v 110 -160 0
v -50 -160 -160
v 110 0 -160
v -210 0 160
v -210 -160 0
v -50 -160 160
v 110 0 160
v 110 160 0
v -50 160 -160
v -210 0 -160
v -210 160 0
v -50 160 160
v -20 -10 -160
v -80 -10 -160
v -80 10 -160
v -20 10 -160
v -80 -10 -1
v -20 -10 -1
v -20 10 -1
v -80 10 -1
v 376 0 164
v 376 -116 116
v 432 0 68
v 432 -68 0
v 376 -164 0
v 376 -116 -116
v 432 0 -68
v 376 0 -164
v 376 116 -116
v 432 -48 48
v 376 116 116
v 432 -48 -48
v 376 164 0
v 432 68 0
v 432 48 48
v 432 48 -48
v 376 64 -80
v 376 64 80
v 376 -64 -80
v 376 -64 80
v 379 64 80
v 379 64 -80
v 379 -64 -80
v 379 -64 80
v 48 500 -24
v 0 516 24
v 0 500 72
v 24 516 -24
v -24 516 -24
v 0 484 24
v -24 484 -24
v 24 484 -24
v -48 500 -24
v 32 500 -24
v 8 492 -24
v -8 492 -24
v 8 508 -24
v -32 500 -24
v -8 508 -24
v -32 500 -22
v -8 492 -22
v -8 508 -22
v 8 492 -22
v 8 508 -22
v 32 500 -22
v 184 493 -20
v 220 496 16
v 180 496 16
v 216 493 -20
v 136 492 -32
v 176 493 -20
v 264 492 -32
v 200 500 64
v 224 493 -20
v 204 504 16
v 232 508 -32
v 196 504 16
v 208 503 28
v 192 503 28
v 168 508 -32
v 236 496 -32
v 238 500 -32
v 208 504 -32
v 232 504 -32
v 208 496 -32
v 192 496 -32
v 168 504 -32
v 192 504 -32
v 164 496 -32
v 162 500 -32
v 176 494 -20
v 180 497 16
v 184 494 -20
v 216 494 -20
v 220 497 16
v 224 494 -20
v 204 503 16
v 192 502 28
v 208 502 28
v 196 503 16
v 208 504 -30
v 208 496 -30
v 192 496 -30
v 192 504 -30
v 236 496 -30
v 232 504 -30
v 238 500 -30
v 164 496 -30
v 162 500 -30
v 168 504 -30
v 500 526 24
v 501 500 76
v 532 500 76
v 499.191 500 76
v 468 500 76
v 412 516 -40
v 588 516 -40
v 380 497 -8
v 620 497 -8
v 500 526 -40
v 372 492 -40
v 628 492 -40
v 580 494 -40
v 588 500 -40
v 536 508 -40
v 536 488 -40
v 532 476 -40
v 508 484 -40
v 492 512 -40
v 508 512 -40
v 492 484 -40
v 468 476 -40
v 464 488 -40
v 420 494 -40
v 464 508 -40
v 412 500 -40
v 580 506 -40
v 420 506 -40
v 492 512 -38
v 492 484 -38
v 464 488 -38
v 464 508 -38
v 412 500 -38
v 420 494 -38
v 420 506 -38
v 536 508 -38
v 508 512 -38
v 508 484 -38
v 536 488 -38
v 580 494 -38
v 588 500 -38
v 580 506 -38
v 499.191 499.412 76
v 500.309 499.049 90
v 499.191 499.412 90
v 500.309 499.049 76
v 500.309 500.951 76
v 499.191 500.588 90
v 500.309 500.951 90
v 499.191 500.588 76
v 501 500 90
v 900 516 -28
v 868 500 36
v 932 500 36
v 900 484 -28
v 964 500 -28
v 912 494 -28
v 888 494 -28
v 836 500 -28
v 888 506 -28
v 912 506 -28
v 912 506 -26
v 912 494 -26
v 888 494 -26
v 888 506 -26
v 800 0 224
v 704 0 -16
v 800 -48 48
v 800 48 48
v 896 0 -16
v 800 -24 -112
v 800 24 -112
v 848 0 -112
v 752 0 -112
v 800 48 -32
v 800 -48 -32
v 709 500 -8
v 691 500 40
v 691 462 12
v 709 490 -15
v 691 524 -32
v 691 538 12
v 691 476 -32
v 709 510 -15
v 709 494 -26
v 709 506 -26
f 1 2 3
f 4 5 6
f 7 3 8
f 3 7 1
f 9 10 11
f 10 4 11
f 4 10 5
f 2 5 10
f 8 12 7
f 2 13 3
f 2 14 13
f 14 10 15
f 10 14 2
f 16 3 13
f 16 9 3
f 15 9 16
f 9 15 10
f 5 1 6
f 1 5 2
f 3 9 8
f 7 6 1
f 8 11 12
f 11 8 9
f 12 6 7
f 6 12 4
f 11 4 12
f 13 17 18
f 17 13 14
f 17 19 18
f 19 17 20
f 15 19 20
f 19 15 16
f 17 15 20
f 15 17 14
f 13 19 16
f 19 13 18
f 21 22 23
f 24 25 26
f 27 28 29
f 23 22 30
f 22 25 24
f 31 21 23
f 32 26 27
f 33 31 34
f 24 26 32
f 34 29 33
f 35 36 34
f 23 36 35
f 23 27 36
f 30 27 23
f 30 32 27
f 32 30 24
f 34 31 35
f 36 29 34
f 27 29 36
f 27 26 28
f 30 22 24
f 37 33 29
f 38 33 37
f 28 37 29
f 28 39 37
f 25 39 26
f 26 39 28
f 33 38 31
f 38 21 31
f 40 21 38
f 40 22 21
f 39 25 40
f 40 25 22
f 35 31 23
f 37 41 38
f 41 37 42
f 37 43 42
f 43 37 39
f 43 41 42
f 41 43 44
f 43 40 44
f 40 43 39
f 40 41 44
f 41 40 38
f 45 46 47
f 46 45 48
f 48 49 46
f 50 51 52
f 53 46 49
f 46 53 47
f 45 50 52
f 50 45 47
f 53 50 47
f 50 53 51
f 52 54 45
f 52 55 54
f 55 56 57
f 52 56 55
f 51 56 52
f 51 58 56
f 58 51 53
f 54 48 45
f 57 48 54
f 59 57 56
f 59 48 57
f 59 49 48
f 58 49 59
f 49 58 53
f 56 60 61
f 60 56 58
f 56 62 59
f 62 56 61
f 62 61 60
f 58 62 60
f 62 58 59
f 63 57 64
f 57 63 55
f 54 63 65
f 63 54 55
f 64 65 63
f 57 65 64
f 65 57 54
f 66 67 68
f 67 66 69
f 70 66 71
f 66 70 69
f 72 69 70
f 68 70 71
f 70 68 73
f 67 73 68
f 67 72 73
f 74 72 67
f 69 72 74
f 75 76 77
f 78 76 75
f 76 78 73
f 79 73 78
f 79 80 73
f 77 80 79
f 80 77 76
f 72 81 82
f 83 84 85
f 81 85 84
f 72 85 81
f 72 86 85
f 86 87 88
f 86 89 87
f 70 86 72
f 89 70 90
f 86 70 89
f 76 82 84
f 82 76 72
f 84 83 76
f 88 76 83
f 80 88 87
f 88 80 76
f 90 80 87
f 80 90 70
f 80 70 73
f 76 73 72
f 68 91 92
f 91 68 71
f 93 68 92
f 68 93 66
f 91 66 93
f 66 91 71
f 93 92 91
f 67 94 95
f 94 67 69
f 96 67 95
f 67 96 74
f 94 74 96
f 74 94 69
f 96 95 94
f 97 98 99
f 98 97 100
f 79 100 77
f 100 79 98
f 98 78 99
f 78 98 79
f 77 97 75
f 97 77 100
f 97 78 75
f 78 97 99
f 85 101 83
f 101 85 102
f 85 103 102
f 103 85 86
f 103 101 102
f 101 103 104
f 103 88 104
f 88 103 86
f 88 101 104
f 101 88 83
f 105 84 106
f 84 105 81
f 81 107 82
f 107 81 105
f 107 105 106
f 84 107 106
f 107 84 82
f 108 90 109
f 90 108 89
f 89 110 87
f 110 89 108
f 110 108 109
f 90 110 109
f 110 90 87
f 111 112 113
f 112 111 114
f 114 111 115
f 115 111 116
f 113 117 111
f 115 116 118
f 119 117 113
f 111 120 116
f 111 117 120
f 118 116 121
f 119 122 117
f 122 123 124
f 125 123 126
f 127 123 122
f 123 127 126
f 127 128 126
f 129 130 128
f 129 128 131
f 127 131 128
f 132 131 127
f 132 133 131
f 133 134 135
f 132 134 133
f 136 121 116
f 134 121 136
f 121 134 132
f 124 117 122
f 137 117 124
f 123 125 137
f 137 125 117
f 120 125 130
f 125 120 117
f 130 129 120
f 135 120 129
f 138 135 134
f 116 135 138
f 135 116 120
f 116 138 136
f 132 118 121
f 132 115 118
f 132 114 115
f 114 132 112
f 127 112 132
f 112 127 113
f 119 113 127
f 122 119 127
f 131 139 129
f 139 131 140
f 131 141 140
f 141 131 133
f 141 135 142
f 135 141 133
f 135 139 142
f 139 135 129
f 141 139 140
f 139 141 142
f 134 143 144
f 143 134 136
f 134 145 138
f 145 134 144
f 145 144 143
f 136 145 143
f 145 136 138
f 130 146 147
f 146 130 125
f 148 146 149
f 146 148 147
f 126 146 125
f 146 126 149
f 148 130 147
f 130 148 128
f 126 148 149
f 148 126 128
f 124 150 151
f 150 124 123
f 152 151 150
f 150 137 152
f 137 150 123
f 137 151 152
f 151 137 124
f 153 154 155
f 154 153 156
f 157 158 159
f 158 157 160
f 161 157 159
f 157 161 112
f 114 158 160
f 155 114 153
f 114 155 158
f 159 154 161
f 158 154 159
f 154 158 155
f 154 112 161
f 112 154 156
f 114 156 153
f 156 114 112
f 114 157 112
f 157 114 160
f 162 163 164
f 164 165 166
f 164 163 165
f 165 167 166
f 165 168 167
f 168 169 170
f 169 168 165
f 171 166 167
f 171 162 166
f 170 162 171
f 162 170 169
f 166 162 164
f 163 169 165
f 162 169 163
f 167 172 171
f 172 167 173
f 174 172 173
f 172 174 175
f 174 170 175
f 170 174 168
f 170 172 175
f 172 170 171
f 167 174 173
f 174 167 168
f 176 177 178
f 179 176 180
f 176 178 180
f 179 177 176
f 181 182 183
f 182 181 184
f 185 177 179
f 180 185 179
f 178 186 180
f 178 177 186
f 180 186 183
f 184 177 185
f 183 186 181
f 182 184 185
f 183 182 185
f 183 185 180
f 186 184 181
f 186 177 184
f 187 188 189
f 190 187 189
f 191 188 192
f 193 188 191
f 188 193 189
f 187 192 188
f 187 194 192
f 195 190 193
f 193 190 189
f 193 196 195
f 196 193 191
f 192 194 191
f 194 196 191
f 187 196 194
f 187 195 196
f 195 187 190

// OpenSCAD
// file: elite.scad
module _extrude_triangle(tri, h, h_base=[0, 0, 0], ccw=false) {
  
  points = [
    tri[0] + h_base,
    tri[1] + h_base,
    tri[2] + h_base,
    tri[0] + h,
    tri[1] + h,
    tri[2] + h,
  ];

  if (ccw == true) {
    points = [
      tri[0] + h_base,
      tri[2] + h_base,
      tri[1] + h_base,
      tri[0] + h,
      tri[2] + h,
      tri[1] + h,
    ];
  }

  polyhedron(points, faces = [
    [0, 1, 2], // top
    [3, 5, 4], // bottom
    [0, 2, 3], [2, 5, 3],
    [1, 0, 3], [1, 3, 4],
    [2, 1, 4], [2, 4, 5],
  ]);

}

module elite_coriolis (r=160, center=false) {

  s = r / 160;

  t = center ? [0, 0, 0] : [160, 160, 160];

  points = [
    [160, 0, 160], [0, 160, 160], [-160, 0, 160], [0, -160, 160], [160, -160, 0],
    [160, 160, 0], [-160, 160, 0], [-160, -160, 0], [160, 0, -160], [0, 160, -160],
    [-160, 0, -160], [0, -160, -160],
  ];

  scale([s, s, s])
  translate(t)
  difference()
  {
    polyhedron( points, faces = [
      [ 0, 4, 3], [ 0, 1, 5 ], [ 1, 2, 6 ], [ 2, 3, 7 ], [ 3, 4, 11, 7 ],
      [ 8, 4, 0, 5], [ 2, 7, 10, 6], [ 1, 6, 9, 5 ], [ 10, 7, 11 ], [ 8, 11, 4 ],
      [ 8, 5, 9 ], [ 6, 10, 9], [ 9, 10, 11, 8 ], [ 0, 3, 2, 1 ],
    ]);

    entry_width = 60;
    entry_height = 20;
    translate([- entry_height / 2, -entry_width / 2, 1])
    cube([entry_height, entry_width, 160]);
  }
}


module elite_cobra_mkiii (width=256, center=false) {

  s = width / 256;
  t = center ? [0, 0, 0] : [120, 26, 40];

  points = [
    [  32,   0,  76], [ -32,   0,  76], [   0,  26,  24], [-120,  -3,  -8], [ 120,  -3,  -8],
    [ -88,  16, -40], [  88,  16, -40], [ 128,  -8, -40], [-128,  -8, -40], [   0,  26, -40],
    [ -32, -24, -40], [  32, -24, -40],
  ];

  scale([s, s, s])
  translate(t)
  {
    difference()
    {
      polyhedron(points, faces=[
        [0, 1, 2], [1, 5, 2], [0, 2, 6], [1, 3, 5], [0, 6, 4],
        [2, 5, 9], [2, 9, 6], [3, 8, 5], [4, 6, 7], [7, 6, 9, 5, 8, 10, 11],
        [1, 10, 8, 3], [11, 10, 1, 0], [0, 4, 7, 11]
      ]);

      // backburner-1
      translate([0, 0, -40-2])
      linear_extrude(height=4)
      polygon(points=[[ -8, 12], [-36, 8], [-36, -12], [-8, -16]]);

      // backburner-1 fin
      translate([0, 0, -40-2])
      linear_extrude(height=4)
      polygon(points=[[-80, 6], [-80, -6], [-88, 0]]);

      // backburner-2
      translate([0, 0, -40-2])
      linear_extrude(height=4)
      polygon(points=[[ 8, 12], [36, 8], [36, -12], [8, -16]]);

      // backburner-2 fin
      translate([0, 0, -40-2])
      linear_extrude(height=4)
      polygon(points=[[80, 6], [80, -6], [88, 0]]);
    }

    // beam
    translate([0, 0, 76])
    cylinder(r=1, h=14);
  }
}



module elite_sidewinder (width=128, center=false) {

  s = width / 128;
  t = center ? [0, 0, 0] : [64, 16, 28];

  points = [
    [-32, 0, 36], [32, 0, 36], [64, 0, -28], [-64, 0, -28], [0, 16, -28],
    [0, -16, -28],
  ];


  scale([s, s, s])
  translate(t)
  {
    difference()
    {
      polyhedron(points, faces = [
        [0, 4, 1], [0, 1, 5], [1, 4, 2], [1, 2, 5], [0, 3, 4],
        [0, 5, 3], [3, 5, 2, 4],
      ]);

      // backburner
      translate([-12, -6, -28-2])
      cube([24, 12, 4]);
    }
  }

}


module elite_viper (width=96, center=false) {

  s = width / 96;
  t = center ? [0, 0, 0] : [48, 16, 24];

  points = [
    [0, 0, 72], [0, 16, 24], [0, -16, 24], [48, 0, -24], [-48, 0, -24],
    [24, -16, -24], [-24, -16, -24], [24, 16, -24], [-24, 16, -24], [-32, 0, -24],
    [32, 0, -24], [8, 8, -24], [-8, 8, -24], [-8, -8, -24], [8, -8, -24],
  ];

  scale([s, s, s])
  translate(t)
  {
    difference()
    {
      polyhedron(points, faces = [
        [0, 1, 7, 3], [0, 3, 5, 2], [0, 4, 8, 1], [0, 2, 6, 4], [1, 8, 7],
        [2, 5, 6], [3, 7, 8, 4, 6, 5],
      ]);

      // backburner-1
      translate([0, 0, -24-2])
      linear_extrude(height=4)
      polygon(points=[[ -32, 0], [-8, -8], [-8, 8]]);

      // backburner-2
      translate([0, 0, -24-2])
      linear_extrude(height=4)
      polygon(points=[[ 8, 8], [8, -8], [32, 0]]);

    }
  }
}


module elite_mamba (width=128, center=false) {

  s = width / 128;

  t = center ? [0, 0, 0] : [64, 8, 32];

  points = [
    [0, 0, 64], [-64, -8, -32], [-32, 8, -32], [32, 8, -32], [64, -8, -32],
  ];

  extrusions = [
    [-4, 4, 16], [4, 4, 16], [8, 3, 28], [-8, 3, 28], [-20, -4, 16],
    [20, -4, 16], [-24, -7, -20], [-16, -7, -20], [16, -7, -20], [24, -7, -20],
    [-8, 4, -32], [8, 4, -32], [8, -4, -32], [-8, -4, -32], [-32, 4, -32],
    [32, 4, -32], [36, -4, -32], [-36, -4, -32], [-38, 0, -32], [38, 0, -32],
  ];

  scale([s, s, s])
  translate(t)
  {
    difference()
    {
      polyhedron(points, faces = [
        [0, 4, 1], [0, 1, 2], [0, 3, 4], [2, 1, 4, 3], [0, 2, 3],
      ]);

      _extrude_triangle([extrusions[4], extrusions[7], extrusions[6]], h=[0, 1, 0], h_base=[0, -1, 0]);
      _extrude_triangle([extrusions[5], extrusions[9], extrusions[8]], h=[0, 1, 0], h_base=[0, -1, 0]);

      // practically invisible on default view :(
      _extrude_triangle([extrusions[0], extrusions[2], extrusions[3]], h=[0, 1, 0], h_base=[0, -1, 0]);
      _extrude_triangle([extrusions[0], extrusions[1], extrusions[2]], h=[0, 1, 0], h_base=[0, -1, 0]);

      translate([0, 0, -32-2])
      linear_extrude(height=4)
      polygon(points=[[ -8, 4], [8, 4], [8, -4], [-8, -4]]);

      translate([0, 0, -32-2])
      linear_extrude(height=4)
      polygon(points=[[ 32, 4], [36, -4], [38, 0]]);

      translate([0, 0, -32-2])
      linear_extrude(height=4)
      polygon(points=[[ -32, 4], [-36, -4], [-38, 0]]);

    }
  }
}



module elite_thargoid (r=164, center=false) {

  s = r / 164;
  t = center ? [0, 0, 0] : [24, 164, 164];

  points = [
    [32, -48, 48], [32, -68, 0], [32, -48, -48], [32, 0, -68], [32, 48, -48],
    [32, 68, 0], [32, 48, 48], [32, 0, 68], [-24, -116, 116], [-24, -164, 0],
    [-24, -116, -116], [-24, 0, -164], [-24, 116, -116], [-24, 164, 0], [-24, 116, 116],
    [-24, 0, 164],
  ];

  scale([s, s, s])
  translate(t)
  {
    difference()
    {
      polyhedron(points, faces = [
        [7, 0, 8, 15], [6, 7, 15, 14], [5, 6, 14, 13], [4, 5, 13, 12], [3, 4, 12, 11],
        [2, 3, 11, 10], [1, 2, 10, 9], [0, 1, 9, 8], [7, 6, 5, 4, 3, 2, 1, 0], [8, 9, 10, 11, 12, 13, 14, 15],
      ]);

      translate([-24-1, 0, 0])
      rotate([0, 90, 0])
      rotate([0, 0, 90])
      linear_extrude(height=4)
      polygon(points=[[ 64, 80 ], [ 64, -80 ], [ -64, -80 ], [ -64, 80 ]]);

    }
  }
}



module elite_thargon (width=76, center=false) {

  s = width / 76;
  t = center ? [0, 0, 0] : [9, 38, 32];

  points = [
    [-9, 0, 40], [-9, -38, 12], [-9, -24, -32], [-9, 24, -32], [-9, 38, 12],
    [9, 0, -8], [9, -10, -15], [9, -6, -26], [9, 6, -26], [9, 10, -15],
  ];

  scale([s, s, s])
  translate(t)
  {
    polyhedron(points, faces = [
      [1, 0, 5, 6], [0, 1, 2, 3, 4], [0, 4, 9, 5], [2, 1, 6, 7], [3, 2, 7, 8],
      [4, 3, 8, 9], [9, 8, 7, 6, 5],
    ]);
  }
}


module elite_python (width=192, center=false) {

  s = width / 192;
  t = center ? [0, 0, 0] : [96, 48, 112];

  points = [
    [0, 0, 224], [0, 48, 48], [96, 0, -16], [-96, 0, -16], [0, 48, -32],
    [0, 24, -112], [-48, 0, -112], [48, 0, -112], [0, -48, 48], [0, -48, -32],
    [0, -24, -112],
  ];

  scale([s, s, s])
  translate(t)
  {
    polyhedron(points, faces = [
    [0, 8, 3], [0, 2, 8], [0, 3, 1], [0, 1, 2], [2, 1, 4],
    [1, 3, 4], [2, 4, 5, 7], [3, 6, 5, 4], [2, 9, 8], [3, 8, 9],
    [2, 7, 10, 9], [3, 9, 10, 6], [5, 6, 10, 7],
    ]);
  }
}
// main file
include <elite.scad>

$t=$t; // fix some magic wher running from command line: $t appears as 0 in assignments

ra = 360 * $t;
rb = 360 * $t;
rc = 360 * $t;

translate([-50, 0, 0])
rotate([ra, 180 + rb, 90 + rc])
elite_coriolis (r=160, center=true);

translate([400, 0, 0])
rotate([ra, rb, rc])
elite_thargoid (r=164, center=true);

translate([800, 0, 0])
rotate([ra, rb, rc])
elite_python (width=192, center=true);


translate([0, 500, 0])
rotate([ra, rb, rc])
elite_viper (width=96, center=true);

translate([200, 500, 0])
rotate([ra, rb, rc])
elite_mamba (width=128, center=true);

translate([500, 500, 0])
rotate([ra, rb, rc])
elite_cobra_mkiii (width=256, center=true);

translate([700, 500, 0])
rotate([ra, rb, rc])
elite_thargon (width=76, center=true);

translate([900, 500, 0])
rotate([ra, rb, rc])
elite_sidewinder (width=128, center=true);
